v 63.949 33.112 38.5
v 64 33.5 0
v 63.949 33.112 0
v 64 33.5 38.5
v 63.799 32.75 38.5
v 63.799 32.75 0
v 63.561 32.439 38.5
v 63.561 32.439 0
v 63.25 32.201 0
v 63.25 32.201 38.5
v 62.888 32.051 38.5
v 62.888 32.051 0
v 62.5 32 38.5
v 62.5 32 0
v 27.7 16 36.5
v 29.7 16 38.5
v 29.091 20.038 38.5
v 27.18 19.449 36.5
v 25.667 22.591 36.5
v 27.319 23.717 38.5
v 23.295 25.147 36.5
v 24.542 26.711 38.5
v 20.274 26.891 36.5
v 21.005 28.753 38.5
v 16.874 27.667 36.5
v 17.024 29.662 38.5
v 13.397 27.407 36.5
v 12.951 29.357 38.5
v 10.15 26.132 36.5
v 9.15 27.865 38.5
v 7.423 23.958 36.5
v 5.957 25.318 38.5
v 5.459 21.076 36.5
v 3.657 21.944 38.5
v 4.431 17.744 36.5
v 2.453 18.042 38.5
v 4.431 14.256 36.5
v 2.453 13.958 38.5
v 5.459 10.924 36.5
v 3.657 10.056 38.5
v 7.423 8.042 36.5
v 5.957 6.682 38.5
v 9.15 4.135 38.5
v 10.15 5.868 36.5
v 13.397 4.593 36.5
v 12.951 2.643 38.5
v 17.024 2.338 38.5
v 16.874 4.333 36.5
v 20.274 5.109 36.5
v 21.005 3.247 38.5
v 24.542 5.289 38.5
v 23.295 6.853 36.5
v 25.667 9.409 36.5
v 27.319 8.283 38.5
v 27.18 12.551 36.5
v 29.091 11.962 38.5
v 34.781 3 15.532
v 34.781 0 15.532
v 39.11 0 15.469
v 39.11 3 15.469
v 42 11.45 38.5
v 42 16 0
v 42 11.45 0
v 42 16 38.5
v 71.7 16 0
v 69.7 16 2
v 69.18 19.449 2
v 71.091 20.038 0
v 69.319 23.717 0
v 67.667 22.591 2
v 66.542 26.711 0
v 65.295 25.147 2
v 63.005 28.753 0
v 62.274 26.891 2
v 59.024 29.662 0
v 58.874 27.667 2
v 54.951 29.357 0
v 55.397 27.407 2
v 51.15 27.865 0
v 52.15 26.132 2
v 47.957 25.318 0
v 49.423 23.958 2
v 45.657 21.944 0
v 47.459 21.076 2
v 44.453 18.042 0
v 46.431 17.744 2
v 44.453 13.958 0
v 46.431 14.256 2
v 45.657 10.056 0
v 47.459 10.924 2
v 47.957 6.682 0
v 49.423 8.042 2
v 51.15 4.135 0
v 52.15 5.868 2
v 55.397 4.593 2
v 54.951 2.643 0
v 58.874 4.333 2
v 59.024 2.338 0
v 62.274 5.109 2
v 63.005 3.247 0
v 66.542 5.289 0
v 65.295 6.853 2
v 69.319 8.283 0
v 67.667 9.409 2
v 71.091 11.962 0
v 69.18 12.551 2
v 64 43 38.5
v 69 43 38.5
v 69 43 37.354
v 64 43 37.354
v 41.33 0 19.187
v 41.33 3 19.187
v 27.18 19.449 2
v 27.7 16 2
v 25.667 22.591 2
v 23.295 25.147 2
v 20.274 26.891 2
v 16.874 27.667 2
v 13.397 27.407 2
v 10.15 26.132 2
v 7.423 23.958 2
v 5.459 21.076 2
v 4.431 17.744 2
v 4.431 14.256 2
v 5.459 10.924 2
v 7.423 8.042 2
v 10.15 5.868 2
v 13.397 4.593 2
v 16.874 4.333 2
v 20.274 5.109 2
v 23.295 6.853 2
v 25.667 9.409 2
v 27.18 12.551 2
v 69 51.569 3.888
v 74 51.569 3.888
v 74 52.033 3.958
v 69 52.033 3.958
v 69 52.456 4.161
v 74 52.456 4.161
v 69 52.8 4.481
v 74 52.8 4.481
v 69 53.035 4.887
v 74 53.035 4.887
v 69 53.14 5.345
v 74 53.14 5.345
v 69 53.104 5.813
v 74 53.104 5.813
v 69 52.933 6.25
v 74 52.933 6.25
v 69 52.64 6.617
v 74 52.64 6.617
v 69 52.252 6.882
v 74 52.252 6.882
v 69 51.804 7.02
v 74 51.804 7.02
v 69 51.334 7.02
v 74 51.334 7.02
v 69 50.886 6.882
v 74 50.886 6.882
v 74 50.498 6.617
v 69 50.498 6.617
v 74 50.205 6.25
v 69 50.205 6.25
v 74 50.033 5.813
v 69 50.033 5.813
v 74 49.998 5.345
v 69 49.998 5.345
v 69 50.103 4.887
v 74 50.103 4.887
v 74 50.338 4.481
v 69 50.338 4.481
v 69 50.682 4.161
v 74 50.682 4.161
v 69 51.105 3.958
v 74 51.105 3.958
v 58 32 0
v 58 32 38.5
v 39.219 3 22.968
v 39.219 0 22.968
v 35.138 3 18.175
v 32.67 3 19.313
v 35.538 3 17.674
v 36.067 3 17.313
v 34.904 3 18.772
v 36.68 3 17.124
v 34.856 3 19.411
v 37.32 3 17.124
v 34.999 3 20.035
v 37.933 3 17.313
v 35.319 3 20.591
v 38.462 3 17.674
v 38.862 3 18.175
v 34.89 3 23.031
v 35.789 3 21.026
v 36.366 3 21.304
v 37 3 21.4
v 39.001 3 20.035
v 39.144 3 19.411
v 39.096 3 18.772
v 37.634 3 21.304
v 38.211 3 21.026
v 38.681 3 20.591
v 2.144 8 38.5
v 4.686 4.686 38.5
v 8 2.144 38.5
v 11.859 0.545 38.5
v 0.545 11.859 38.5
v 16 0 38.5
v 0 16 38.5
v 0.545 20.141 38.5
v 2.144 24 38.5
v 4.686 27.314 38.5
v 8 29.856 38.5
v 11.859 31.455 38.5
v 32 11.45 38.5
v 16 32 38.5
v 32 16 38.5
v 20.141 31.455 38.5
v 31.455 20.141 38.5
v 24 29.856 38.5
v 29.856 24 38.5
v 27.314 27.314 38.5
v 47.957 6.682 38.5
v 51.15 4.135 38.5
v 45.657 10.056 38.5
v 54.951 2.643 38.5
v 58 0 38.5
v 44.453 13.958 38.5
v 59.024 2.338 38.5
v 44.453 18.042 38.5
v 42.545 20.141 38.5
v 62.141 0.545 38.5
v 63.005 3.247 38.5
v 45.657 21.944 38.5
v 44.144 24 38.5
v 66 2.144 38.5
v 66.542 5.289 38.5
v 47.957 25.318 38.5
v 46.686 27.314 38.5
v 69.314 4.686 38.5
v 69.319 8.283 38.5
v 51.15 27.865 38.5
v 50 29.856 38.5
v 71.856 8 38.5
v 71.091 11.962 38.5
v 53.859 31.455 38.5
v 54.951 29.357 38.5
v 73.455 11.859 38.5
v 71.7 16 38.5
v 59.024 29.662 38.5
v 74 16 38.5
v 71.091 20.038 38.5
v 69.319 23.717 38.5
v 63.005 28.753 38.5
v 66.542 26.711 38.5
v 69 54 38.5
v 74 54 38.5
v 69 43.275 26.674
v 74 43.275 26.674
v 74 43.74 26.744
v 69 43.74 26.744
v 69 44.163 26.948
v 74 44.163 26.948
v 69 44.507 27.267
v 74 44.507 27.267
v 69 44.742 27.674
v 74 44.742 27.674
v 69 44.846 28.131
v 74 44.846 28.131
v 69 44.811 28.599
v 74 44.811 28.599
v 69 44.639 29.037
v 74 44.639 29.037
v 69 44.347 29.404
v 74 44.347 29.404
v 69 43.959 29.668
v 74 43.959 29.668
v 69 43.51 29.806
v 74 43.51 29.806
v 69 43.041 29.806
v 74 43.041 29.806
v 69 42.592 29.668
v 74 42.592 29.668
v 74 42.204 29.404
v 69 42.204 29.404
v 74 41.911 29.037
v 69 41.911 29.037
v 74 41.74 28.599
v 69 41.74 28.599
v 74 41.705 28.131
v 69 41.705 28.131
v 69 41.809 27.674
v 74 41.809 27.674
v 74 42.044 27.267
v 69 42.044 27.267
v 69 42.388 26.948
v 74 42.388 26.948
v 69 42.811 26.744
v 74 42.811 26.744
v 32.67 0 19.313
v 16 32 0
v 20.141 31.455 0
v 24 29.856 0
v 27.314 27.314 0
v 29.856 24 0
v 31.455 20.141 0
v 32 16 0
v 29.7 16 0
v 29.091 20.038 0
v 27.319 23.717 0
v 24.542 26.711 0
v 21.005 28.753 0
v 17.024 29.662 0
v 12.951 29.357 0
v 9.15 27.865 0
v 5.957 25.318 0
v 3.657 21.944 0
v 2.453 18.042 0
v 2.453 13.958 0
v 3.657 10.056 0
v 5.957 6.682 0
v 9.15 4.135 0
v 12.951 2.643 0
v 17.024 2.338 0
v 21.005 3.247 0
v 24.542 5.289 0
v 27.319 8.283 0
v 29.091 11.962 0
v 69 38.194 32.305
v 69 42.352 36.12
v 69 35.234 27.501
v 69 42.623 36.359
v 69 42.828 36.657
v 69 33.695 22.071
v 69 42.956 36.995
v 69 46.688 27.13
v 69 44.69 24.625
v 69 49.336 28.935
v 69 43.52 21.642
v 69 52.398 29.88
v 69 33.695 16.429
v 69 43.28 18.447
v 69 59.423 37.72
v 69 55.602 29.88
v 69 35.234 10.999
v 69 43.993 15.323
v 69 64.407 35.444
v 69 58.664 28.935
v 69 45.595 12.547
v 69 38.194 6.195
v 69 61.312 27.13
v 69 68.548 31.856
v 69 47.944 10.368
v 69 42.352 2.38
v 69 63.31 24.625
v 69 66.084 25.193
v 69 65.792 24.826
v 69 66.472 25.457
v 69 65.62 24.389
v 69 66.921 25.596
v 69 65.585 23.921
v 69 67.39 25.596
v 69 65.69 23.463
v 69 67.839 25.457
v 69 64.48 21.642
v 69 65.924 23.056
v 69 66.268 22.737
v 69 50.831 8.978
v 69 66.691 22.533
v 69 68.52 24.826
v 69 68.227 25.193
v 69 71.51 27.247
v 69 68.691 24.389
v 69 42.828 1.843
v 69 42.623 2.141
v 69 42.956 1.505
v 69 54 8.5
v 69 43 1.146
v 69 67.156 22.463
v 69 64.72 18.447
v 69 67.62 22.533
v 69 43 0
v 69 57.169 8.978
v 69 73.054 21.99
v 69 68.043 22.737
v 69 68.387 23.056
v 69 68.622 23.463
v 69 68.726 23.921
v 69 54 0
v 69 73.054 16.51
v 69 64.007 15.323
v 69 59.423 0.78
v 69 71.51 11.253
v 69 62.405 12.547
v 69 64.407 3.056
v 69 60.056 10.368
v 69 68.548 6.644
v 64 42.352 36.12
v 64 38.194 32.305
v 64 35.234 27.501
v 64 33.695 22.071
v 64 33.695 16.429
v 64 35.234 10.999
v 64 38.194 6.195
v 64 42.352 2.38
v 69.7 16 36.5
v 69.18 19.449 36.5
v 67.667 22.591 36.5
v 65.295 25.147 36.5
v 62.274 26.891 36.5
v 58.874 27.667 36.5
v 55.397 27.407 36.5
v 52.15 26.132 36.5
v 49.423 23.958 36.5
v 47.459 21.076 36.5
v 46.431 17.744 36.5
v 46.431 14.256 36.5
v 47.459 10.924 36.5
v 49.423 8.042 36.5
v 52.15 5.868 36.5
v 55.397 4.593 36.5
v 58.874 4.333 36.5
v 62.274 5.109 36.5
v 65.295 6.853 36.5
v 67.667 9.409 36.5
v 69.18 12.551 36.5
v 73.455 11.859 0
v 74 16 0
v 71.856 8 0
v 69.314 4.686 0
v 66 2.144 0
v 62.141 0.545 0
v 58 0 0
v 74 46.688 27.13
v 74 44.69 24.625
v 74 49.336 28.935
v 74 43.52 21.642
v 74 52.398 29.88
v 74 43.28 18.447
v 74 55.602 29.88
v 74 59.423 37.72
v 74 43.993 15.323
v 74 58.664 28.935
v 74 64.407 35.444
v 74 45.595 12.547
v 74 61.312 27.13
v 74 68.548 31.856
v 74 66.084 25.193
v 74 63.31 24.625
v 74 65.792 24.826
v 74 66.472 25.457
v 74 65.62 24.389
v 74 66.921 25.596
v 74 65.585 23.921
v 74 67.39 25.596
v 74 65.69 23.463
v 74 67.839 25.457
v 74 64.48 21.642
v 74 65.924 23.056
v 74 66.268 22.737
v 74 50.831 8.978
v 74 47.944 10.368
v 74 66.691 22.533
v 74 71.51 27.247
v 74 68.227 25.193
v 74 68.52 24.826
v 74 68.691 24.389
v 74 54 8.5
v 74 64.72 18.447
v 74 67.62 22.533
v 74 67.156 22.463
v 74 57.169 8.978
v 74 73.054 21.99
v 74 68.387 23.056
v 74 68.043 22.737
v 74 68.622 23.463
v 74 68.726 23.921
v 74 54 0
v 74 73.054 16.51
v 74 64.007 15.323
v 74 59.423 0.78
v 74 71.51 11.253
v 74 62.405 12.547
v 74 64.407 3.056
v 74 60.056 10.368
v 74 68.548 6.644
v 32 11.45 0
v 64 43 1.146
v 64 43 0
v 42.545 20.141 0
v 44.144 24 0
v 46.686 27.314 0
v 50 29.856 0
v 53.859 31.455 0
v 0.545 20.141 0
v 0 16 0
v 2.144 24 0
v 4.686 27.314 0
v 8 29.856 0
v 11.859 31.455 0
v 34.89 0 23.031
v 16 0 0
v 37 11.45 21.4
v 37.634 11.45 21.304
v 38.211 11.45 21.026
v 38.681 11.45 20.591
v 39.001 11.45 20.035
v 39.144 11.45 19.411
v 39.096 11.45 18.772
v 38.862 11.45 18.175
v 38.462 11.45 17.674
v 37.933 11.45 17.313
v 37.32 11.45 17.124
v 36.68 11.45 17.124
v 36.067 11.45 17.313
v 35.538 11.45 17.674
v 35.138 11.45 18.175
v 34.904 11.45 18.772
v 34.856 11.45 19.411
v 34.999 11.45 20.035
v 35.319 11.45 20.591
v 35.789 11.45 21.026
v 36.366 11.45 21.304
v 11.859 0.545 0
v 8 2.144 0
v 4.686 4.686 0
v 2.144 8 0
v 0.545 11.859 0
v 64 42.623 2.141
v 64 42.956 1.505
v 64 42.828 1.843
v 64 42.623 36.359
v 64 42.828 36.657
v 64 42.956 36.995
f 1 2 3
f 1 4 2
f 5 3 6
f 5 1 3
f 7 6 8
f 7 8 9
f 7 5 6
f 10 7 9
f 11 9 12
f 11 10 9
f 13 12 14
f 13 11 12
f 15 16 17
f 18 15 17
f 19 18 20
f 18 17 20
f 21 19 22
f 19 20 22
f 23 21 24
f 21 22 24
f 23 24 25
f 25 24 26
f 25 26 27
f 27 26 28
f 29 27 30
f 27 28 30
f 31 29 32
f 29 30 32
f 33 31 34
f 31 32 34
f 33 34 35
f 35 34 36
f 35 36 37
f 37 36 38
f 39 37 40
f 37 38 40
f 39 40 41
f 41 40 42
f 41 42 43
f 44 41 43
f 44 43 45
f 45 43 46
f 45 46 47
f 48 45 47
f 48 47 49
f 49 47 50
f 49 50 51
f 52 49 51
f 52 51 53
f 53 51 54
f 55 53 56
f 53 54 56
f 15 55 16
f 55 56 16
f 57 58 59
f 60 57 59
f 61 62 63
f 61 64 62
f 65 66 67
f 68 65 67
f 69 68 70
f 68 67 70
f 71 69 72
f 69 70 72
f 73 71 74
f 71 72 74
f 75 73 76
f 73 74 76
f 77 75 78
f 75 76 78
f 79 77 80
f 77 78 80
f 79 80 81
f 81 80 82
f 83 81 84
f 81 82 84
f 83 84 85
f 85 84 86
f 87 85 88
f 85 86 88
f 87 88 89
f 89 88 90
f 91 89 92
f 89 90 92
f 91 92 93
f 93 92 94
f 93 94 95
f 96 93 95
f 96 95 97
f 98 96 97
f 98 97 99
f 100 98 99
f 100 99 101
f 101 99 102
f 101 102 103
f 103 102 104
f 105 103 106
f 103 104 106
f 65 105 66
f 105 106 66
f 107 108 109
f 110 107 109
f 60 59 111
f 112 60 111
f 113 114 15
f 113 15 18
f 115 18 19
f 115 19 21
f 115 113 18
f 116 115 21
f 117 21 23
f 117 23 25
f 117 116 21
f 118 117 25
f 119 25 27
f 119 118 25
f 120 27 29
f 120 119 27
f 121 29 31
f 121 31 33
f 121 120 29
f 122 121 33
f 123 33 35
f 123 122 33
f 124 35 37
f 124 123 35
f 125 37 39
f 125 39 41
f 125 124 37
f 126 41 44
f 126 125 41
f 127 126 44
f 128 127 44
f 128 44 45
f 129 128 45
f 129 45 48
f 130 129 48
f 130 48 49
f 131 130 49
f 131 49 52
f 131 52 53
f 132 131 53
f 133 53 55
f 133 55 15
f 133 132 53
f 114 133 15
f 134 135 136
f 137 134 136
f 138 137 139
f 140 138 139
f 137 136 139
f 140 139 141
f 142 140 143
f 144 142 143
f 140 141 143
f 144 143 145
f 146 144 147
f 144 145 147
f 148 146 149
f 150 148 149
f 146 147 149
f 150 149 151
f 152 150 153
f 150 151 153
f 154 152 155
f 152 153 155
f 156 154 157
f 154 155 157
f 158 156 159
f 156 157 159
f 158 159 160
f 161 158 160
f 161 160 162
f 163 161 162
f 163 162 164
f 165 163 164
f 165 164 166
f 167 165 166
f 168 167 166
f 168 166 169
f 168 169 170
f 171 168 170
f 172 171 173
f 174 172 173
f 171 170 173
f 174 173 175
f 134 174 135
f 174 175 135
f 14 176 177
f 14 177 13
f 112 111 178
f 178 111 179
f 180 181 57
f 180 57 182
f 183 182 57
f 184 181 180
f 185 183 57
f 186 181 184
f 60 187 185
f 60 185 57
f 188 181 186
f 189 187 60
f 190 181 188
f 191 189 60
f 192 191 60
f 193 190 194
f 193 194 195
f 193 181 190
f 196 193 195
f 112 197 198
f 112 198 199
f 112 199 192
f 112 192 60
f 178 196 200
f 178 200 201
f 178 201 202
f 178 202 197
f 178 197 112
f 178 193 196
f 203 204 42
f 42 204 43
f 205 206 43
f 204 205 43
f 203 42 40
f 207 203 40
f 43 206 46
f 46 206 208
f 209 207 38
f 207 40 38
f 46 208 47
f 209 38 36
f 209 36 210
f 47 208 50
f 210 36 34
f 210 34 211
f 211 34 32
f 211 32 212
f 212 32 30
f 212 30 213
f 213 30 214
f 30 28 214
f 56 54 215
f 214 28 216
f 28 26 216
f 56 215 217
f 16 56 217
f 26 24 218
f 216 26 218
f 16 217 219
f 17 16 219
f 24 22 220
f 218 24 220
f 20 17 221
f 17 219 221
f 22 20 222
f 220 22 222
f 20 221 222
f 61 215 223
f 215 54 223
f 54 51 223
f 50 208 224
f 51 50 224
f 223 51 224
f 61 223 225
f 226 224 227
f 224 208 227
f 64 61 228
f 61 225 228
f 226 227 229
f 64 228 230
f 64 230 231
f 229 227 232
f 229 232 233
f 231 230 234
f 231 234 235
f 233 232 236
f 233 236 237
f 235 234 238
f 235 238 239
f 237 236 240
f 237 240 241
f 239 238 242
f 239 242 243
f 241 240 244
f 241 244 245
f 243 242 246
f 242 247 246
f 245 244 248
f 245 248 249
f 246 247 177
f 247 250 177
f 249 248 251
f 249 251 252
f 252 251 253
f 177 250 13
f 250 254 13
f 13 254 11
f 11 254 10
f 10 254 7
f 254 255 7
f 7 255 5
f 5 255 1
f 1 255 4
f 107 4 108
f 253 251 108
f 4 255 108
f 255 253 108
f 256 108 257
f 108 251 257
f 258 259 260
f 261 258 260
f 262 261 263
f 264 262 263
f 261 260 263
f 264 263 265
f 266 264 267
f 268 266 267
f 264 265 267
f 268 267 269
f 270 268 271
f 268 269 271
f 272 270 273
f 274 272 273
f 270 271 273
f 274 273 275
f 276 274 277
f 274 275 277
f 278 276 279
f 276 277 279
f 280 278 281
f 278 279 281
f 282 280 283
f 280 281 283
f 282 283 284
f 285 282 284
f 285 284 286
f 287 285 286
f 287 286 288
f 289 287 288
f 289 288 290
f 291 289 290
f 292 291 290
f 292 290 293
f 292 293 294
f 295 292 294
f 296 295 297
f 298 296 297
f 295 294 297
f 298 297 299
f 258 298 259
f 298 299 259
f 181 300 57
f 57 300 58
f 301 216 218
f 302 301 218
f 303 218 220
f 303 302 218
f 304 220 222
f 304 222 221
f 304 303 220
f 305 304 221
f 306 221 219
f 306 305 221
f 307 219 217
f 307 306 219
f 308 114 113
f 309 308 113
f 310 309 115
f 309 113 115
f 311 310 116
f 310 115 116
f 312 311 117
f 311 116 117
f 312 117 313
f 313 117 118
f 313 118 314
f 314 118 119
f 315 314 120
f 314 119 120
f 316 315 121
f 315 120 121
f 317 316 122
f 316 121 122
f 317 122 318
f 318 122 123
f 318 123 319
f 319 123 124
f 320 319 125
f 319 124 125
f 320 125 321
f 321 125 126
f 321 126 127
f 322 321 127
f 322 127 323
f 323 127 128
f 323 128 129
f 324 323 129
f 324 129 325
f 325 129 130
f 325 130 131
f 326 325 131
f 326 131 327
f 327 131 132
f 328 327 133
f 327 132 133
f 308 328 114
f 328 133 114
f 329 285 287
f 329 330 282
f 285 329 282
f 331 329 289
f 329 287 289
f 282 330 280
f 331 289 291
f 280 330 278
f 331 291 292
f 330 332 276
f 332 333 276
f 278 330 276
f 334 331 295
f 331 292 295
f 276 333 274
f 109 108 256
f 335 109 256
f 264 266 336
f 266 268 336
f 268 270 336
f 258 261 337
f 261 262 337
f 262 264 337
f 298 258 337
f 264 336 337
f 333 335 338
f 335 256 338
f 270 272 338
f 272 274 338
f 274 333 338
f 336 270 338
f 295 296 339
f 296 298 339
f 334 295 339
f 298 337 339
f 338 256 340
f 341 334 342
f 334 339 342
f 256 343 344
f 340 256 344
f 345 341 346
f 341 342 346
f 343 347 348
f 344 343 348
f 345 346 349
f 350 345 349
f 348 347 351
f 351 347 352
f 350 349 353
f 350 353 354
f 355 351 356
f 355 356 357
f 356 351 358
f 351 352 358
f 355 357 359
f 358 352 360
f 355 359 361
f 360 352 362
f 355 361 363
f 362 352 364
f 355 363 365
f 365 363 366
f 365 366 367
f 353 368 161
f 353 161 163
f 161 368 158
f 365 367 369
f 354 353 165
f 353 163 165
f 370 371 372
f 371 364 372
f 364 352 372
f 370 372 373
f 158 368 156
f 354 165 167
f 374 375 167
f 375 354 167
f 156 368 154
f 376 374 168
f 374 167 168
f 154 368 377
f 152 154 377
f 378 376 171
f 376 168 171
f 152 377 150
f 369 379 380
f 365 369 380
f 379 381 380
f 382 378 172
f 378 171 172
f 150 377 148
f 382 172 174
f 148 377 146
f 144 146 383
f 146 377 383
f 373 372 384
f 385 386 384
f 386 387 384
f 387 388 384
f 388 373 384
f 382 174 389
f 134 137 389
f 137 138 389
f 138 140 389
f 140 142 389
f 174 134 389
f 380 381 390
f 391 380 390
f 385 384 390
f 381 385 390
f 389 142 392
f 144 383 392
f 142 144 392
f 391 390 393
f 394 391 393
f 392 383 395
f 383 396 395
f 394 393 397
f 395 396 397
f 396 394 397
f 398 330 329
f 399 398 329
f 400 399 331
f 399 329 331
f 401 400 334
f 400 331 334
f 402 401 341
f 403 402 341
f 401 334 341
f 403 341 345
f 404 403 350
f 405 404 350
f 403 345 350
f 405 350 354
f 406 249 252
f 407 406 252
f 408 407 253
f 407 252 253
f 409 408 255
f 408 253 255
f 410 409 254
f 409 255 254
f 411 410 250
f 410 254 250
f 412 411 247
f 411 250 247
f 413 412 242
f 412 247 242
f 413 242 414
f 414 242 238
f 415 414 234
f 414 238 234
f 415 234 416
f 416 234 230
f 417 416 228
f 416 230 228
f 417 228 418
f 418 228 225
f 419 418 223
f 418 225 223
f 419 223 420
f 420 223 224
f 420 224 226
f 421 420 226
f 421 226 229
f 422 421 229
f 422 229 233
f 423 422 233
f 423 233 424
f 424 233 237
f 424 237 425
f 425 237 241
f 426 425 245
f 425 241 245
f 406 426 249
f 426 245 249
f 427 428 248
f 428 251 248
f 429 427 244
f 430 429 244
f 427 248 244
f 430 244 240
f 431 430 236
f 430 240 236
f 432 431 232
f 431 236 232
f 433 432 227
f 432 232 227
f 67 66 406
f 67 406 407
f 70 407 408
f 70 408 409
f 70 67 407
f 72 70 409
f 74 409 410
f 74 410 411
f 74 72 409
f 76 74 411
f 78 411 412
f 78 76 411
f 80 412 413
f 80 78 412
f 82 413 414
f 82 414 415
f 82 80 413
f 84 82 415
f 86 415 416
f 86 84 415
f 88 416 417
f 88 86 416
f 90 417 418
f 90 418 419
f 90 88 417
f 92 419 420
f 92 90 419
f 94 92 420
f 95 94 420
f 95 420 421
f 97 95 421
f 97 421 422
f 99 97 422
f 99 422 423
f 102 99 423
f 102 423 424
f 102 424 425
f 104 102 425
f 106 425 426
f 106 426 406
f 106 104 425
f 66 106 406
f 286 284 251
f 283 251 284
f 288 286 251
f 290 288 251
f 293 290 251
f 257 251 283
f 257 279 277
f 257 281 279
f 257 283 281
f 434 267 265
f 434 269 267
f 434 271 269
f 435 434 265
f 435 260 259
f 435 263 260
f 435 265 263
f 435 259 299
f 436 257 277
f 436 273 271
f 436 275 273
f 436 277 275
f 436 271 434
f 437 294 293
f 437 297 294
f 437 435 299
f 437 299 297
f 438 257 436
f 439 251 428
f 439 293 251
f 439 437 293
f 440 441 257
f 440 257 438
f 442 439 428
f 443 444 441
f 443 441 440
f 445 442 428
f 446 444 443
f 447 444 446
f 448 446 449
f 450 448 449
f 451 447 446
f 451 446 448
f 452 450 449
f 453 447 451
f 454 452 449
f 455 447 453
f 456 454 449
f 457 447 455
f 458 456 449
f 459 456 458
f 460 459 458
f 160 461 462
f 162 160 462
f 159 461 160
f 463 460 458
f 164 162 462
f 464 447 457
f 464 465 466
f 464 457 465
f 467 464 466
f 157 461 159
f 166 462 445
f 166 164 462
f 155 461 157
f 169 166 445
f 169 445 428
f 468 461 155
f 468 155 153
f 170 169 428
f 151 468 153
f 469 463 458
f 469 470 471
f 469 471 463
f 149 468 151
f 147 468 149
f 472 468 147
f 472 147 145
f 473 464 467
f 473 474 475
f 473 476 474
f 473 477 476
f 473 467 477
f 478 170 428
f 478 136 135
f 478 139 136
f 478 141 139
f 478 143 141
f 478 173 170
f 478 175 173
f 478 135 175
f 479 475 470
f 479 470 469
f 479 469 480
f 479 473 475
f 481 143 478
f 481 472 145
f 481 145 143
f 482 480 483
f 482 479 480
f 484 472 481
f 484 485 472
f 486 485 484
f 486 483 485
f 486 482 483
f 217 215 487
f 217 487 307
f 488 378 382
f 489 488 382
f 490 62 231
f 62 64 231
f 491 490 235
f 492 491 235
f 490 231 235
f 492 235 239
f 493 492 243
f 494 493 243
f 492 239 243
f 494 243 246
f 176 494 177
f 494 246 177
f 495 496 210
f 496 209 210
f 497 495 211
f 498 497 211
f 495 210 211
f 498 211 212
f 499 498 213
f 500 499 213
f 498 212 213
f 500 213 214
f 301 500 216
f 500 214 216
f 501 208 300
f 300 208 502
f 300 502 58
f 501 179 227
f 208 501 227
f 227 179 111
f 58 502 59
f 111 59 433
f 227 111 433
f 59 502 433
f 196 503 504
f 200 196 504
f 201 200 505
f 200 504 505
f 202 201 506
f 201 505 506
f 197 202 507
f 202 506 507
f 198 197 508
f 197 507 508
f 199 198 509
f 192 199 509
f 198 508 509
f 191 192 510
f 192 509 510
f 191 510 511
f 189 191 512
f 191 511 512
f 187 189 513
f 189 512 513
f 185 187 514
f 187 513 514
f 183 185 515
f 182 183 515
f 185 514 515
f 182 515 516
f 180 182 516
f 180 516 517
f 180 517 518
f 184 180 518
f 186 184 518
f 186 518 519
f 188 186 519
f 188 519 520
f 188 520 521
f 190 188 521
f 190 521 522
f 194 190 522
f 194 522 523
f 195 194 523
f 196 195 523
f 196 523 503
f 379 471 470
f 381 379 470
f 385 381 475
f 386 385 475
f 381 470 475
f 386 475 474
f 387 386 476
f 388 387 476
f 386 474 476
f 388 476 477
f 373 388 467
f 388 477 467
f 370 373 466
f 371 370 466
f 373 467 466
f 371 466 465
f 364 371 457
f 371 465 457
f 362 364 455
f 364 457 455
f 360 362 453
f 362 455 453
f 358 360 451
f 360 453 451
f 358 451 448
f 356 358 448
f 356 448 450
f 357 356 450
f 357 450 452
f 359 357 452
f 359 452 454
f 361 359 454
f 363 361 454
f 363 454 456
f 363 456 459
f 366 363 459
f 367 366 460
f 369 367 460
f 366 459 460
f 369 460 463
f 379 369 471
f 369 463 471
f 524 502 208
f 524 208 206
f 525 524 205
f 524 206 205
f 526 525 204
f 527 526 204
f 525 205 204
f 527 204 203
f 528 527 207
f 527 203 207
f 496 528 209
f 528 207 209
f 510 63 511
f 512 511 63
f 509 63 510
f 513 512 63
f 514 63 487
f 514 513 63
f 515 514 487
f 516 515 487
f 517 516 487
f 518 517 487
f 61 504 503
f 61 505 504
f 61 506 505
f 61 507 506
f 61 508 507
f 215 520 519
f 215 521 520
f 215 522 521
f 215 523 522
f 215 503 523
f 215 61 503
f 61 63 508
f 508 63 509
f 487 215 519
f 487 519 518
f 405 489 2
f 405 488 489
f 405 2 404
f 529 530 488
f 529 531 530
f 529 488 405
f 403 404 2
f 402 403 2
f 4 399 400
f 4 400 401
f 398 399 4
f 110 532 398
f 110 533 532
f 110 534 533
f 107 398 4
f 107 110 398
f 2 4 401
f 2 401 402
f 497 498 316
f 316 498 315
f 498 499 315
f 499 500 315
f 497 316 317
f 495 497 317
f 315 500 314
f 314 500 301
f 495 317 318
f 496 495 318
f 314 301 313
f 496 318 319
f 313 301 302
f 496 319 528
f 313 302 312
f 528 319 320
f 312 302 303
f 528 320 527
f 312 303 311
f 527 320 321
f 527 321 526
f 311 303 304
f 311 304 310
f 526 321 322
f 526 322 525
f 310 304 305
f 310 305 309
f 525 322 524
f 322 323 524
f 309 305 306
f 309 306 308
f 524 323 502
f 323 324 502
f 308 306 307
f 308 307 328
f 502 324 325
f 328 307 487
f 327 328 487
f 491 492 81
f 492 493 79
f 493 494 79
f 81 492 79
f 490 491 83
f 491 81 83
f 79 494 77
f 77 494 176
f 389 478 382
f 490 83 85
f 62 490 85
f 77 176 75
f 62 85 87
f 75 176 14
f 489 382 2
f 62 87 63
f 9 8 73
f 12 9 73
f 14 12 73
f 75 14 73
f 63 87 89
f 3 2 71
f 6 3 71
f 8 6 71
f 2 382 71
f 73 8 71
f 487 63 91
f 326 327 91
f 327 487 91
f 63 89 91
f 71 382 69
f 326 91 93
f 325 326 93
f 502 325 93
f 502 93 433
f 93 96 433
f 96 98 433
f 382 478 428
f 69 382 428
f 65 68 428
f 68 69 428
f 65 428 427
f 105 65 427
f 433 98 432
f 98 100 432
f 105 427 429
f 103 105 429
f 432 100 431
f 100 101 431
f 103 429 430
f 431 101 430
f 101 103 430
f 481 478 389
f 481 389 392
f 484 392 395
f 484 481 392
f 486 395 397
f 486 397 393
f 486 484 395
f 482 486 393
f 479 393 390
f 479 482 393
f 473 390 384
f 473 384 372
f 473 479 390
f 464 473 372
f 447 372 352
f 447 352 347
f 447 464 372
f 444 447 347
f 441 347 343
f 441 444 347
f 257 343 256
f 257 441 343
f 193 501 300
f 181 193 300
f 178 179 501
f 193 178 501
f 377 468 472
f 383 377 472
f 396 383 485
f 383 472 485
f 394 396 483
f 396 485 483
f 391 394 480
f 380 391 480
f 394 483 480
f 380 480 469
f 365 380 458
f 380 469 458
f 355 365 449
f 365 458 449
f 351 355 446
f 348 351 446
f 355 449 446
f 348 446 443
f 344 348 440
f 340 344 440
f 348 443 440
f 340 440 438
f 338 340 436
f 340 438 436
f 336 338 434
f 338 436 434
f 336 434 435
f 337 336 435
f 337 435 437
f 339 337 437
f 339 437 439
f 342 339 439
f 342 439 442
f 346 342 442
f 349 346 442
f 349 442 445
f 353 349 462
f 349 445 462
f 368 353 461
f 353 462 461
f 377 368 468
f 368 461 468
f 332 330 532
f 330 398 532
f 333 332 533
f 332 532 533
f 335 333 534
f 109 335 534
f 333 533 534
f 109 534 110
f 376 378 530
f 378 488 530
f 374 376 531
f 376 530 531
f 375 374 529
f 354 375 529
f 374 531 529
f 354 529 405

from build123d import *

# Parameters (mm, degrees)
SKETCH1_W               = 74
SKETCH1_H               = 32
SKETCH1_R               = 11.7
BOSS_EXTRUDE1_DEPTH     = 38.5
SKETCH2_R               = 1.575
SKETCH2_R_2             = 10.75
BOSS_EXTRUDE2_DEPTH     = 5
BOSS_EXTRUDE3_DEPTH     = 5
CUT_EXTRUDE1_DEPTH      = 112.012668196
CUT_EXTRUDE1_DEPTH_BACK = 112.012668196
SKETCH4_W               = 10
SKETCH4_H               = 25
SKETCH4_H_2             = 4.450035805
SKETCH5_R               = 2.15
CUT_EXTRUDE2_DEPTH      = 18
FILLET8_R               = 16
FILLET9_R               = 1.5
FILLET10_SIZE           = 2
CUT_EXTRUDE3_DEPTH      = 3


with BuildPart() as part:
    # Sketch1 → Boss-Extrude1 (new body)
    with BuildSketch(Plane.XY):
        with Locations((37, 16)):
            Rectangle(SKETCH1_W, SKETCH1_H)
        with Locations((16, 16)):
            Circle(SKETCH1_R, mode=Mode.SUBTRACT)
        with Locations((58, 16)):
            Circle(SKETCH1_R, mode=Mode.SUBTRACT)
    extrude(amount=BOSS_EXTRUDE1_DEPTH)

    # Sketch2 → Boss-Extrude2 (add)
    # profile 1 of 2: a face of its own
    with BuildSketch(Plane(origin=(74, 0, 0), x_dir=(0, 0, -1), z_dir=(1, 0, 0))):
        with BuildLine():
            Line((-38.5, 32), (0, 32))
            Line((0, 32), (0, 54))
            ThreePointArc((0, 54), (-19.25, 34.75), (-38.5, 54))
            Line((-38.5, 54), (-38.5, 32))
        make_face()
    # profile 2 of 2: a face of its own
    with BuildSketch(Plane(origin=(74, 0, 0), x_dir=(0, 0, -1), z_dir=(1, 0, 0))):
        with BuildLine():
            ThreePointArc((-38.5, 54), (-19.25, 34.75), (0, 54))
            ThreePointArc((0, 54), (-19.25, 73.25), (-38.5, 54))
        make_face()
        with Locations((-28.249026536, 43.275377796)):
            Circle(SKETCH2_R, mode=Mode.SUBTRACT)
        with Locations((-24.038282007, 67.155696691)):
            Circle(SKETCH2_R, mode=Mode.SUBTRACT)
        with Locations((-19.25, 54)):
            Circle(SKETCH2_R_2, mode=Mode.SUBTRACT)
        with Locations((-5.462691458, 51.568925513)):
            Circle(SKETCH2_R, mode=Mode.SUBTRACT)
    extrude(amount=-BOSS_EXTRUDE2_DEPTH)

    # Sketch3 → Boss-Extrude3 (add)
    with BuildSketch(Plane.ZY.offset(-69)):
        with BuildLine():
            Line((0, 43), (0, 32))
            Line((0, 32), (38.5, 32))
            Line((38.5, 32), (38.5, 43))
            Line((38.5, 43), (36.548843892, 43))
            ThreePointArc((36.548843892, 43), (19.25, 33.5), (1.951156108, 43))
            Line((1.951156108, 43), (0, 43))
        make_face()
    extrude(amount=BOSS_EXTRUDE3_DEPTH)

    # Sketch4 → Cut-Extrude1 (cut, two sides: drawn at the far end of the back side and taken through both)
    with BuildSketch(Plane(origin=(0, 0, 0), x_dir=(-1, 0, 0), z_dir=(0, 0, -1)).offset(-CUT_EXTRUDE1_DEPTH_BACK)):
        with Locations((-37, 23.950035805)):
            Rectangle(SKETCH4_W, SKETCH4_H)
        with Locations((-37, 34.225017902)):
            Rectangle(SKETCH4_W, SKETCH4_H_2)
    extrude(amount=CUT_EXTRUDE1_DEPTH + CUT_EXTRUDE1_DEPTH_BACK, mode=Mode.SUBTRACT)

    # Sketch5 → Cut-Extrude2 (cut)
    with BuildSketch(Plane(origin=(0, 11.450035805, 0), x_dir=(1, 0, 0), z_dir=(0, 1, 0))):
        with Locations(Location((37, -19.25, 0), (0, 0, 270))):
            Circle(SKETCH5_R)
    extrude(amount=-CUT_EXTRUDE2_DEPTH, mode=Mode.SUBTRACT)

    # Fillet8
    fillet8_edges = [part.edges().sort_by_distance(p)[0] for p in [
        (42, 32, 19.25),
        (32, 32, 19.25),
        (0, 32, 19.25),
        (0, 0, 19.25),
        (74, 0, 19.25),
    ]]
    fillet(fillet8_edges, radius=FILLET8_R - 0.0001)  # a hair under: the kernel refuses the full size

    # Fillet9
    fillet9_edges = [part.edges().sort_by_distance(p)[0] for p in [
        (66.5, 43, 36.548843892),
        (66.5, 43, 1.951156108),
        (64, 32, 19.25),
    ]]
    fillet(fillet9_edges, radius=FILLET9_R - 0.0001)  # a hair under: the kernel refuses the full size

    # Fillet10
    fillet10_edges = [part.edges().sort_by_distance(p)[0] for p in [
        (4.3, 16, 0),
        (4.3, 16, 38.5),
        (46.3, 16, 0),
        (46.3, 16, 38.5),
    ]]
    chamfer(fillet10_edges, length=FILLET10_SIZE)

    # Sketch6 → Cut-Extrude3 (cut)
    with BuildSketch(Plane.XZ):
        Polygon((39.110229916, 15.468871901), (41.329667947, 19.186948665), (39.219438031, 22.968076764), (34.889770084, 23.031128099), (32.670332053, 19.313051335), (34.780561969, 15.531923236), align=None)
    extrude(amount=-CUT_EXTRUDE3_DEPTH, mode=Mode.SUBTRACT)


solid = part.part
